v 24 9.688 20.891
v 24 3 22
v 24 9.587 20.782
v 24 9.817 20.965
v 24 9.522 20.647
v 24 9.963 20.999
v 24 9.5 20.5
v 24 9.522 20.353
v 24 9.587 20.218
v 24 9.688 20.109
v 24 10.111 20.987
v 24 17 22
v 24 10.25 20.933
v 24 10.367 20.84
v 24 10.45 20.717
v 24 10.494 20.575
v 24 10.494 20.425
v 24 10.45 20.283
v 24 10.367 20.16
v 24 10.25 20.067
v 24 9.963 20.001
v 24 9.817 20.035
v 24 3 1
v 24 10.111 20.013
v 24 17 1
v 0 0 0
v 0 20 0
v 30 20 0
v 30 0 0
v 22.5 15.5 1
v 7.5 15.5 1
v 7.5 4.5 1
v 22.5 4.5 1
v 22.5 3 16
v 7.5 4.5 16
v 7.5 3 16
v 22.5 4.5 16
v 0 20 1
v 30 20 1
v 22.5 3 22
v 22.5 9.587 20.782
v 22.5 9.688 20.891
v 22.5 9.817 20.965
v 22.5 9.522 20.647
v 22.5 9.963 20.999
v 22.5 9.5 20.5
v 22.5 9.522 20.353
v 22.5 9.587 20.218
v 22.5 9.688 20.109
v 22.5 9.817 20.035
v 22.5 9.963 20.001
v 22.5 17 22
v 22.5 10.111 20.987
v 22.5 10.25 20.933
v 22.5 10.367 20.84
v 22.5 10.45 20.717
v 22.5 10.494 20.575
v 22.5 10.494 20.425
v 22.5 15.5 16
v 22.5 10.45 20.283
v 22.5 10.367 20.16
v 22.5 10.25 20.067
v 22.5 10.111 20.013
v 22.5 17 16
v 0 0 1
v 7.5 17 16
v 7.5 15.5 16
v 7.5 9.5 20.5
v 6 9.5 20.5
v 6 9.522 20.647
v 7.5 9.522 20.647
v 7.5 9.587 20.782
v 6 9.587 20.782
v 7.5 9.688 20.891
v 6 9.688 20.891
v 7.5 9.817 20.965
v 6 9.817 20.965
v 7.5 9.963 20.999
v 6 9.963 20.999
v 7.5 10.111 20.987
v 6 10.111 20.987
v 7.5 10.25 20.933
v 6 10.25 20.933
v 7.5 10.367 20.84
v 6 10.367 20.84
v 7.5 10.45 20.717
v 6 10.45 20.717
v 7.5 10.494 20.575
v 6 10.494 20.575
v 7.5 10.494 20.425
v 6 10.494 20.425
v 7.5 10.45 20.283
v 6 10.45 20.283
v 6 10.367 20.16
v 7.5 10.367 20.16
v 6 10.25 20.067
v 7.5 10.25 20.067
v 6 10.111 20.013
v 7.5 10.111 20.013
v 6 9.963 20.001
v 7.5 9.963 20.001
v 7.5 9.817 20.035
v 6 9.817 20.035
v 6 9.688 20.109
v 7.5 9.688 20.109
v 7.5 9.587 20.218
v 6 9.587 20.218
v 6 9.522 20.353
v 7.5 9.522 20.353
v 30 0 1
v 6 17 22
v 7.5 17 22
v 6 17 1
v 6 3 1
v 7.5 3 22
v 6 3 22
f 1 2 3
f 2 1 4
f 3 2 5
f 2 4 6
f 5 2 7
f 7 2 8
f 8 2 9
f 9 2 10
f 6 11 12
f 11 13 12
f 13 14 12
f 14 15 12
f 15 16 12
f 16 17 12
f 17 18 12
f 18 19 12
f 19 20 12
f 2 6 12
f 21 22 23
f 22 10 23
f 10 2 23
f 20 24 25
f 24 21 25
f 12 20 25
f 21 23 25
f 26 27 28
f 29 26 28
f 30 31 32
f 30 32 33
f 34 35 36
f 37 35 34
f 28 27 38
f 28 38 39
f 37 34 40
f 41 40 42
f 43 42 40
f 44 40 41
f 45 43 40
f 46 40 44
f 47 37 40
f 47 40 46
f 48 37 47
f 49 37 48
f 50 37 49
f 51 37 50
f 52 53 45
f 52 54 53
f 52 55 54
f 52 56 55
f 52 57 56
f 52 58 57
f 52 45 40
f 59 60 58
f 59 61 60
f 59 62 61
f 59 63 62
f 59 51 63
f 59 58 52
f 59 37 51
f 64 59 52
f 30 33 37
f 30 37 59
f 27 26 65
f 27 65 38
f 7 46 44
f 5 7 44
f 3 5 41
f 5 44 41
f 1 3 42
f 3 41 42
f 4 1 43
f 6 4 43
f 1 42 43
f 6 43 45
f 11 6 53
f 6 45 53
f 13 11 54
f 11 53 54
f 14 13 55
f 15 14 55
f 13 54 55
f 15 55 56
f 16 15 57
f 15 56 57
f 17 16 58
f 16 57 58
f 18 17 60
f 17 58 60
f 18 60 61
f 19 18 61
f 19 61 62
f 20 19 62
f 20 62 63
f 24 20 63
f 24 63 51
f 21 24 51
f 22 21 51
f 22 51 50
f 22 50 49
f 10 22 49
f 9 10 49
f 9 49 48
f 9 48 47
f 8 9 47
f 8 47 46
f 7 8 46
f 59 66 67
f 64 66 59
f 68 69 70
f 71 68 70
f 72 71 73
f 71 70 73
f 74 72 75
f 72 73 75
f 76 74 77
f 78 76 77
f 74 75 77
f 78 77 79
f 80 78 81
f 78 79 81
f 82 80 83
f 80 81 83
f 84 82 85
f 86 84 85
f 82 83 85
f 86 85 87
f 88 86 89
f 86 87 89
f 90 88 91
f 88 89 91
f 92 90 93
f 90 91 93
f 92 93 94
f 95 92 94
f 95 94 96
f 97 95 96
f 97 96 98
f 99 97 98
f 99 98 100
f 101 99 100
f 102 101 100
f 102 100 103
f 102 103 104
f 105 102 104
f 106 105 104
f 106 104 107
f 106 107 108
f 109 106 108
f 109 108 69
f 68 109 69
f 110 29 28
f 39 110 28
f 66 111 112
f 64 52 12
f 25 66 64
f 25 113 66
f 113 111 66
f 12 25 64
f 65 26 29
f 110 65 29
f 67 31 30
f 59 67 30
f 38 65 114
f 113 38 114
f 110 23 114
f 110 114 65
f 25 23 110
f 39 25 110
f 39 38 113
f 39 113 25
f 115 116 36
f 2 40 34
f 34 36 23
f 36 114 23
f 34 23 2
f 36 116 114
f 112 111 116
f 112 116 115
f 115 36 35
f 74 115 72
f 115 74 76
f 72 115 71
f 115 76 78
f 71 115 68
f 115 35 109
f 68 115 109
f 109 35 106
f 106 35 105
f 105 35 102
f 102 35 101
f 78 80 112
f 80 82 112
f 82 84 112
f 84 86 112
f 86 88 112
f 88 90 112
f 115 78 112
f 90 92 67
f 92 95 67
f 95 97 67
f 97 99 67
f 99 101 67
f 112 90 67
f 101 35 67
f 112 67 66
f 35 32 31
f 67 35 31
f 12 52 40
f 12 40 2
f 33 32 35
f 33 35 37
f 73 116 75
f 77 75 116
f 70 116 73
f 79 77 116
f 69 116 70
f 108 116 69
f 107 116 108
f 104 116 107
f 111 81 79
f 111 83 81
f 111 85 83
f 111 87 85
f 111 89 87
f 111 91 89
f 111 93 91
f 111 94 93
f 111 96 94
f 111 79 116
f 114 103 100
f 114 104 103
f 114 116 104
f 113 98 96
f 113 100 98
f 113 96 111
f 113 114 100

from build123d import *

# Parameters (mm, degrees)
F0_W     = 30
F0_H     = 20
F1_DEPTH = 1
F2_W     = 18
F2_H     = 14
F2_W_2   = 15
F2_H_2   = 11
F3_DEPTH = 15
F4_W     = 1.5
F4_H     = 14
F5_DEPTH = 6
F6_R     = 0.5
F7_DEPTH = 24.001


with BuildPart() as f1:
    # F0 (on Top) → F1 (new body)
    with BuildSketch(Plane.XY):
        with Locations((15, 10)):
            Rectangle(F0_W, F0_H)
    extrude(amount=F1_DEPTH)

    # F2 (on face) → F3 (join)
    with BuildSketch(Plane.XY.offset(1)):
        with Locations((15, 10)):
            Rectangle(F2_W, F2_H)
        with Locations((15, 10)):
            Rectangle(F2_W_2, F2_H_2, mode=Mode.SUBTRACT)
    extrude(amount=F3_DEPTH)

    # F4 (on face) → F5 (join)
    with BuildSketch(Plane.XY.offset(16)):
        with Locations((6.75, 10)):
            Rectangle(F4_W, F4_H)
        with Locations((23.25, 10)):
            Rectangle(F4_W, F4_H)
    extrude(amount=F5_DEPTH)

    # F6 (on face) → F7 (cut, through all)
    with BuildSketch(Plane(origin=(6, 0, 0), x_dir=(0, -1, 0), z_dir=(-1, 0, 0))):
        with Locations((-10, 20.5)):
            Circle(F6_R)
    extrude(amount=-F7_DEPTH, mode=Mode.SUBTRACT)


solid = f1.part
